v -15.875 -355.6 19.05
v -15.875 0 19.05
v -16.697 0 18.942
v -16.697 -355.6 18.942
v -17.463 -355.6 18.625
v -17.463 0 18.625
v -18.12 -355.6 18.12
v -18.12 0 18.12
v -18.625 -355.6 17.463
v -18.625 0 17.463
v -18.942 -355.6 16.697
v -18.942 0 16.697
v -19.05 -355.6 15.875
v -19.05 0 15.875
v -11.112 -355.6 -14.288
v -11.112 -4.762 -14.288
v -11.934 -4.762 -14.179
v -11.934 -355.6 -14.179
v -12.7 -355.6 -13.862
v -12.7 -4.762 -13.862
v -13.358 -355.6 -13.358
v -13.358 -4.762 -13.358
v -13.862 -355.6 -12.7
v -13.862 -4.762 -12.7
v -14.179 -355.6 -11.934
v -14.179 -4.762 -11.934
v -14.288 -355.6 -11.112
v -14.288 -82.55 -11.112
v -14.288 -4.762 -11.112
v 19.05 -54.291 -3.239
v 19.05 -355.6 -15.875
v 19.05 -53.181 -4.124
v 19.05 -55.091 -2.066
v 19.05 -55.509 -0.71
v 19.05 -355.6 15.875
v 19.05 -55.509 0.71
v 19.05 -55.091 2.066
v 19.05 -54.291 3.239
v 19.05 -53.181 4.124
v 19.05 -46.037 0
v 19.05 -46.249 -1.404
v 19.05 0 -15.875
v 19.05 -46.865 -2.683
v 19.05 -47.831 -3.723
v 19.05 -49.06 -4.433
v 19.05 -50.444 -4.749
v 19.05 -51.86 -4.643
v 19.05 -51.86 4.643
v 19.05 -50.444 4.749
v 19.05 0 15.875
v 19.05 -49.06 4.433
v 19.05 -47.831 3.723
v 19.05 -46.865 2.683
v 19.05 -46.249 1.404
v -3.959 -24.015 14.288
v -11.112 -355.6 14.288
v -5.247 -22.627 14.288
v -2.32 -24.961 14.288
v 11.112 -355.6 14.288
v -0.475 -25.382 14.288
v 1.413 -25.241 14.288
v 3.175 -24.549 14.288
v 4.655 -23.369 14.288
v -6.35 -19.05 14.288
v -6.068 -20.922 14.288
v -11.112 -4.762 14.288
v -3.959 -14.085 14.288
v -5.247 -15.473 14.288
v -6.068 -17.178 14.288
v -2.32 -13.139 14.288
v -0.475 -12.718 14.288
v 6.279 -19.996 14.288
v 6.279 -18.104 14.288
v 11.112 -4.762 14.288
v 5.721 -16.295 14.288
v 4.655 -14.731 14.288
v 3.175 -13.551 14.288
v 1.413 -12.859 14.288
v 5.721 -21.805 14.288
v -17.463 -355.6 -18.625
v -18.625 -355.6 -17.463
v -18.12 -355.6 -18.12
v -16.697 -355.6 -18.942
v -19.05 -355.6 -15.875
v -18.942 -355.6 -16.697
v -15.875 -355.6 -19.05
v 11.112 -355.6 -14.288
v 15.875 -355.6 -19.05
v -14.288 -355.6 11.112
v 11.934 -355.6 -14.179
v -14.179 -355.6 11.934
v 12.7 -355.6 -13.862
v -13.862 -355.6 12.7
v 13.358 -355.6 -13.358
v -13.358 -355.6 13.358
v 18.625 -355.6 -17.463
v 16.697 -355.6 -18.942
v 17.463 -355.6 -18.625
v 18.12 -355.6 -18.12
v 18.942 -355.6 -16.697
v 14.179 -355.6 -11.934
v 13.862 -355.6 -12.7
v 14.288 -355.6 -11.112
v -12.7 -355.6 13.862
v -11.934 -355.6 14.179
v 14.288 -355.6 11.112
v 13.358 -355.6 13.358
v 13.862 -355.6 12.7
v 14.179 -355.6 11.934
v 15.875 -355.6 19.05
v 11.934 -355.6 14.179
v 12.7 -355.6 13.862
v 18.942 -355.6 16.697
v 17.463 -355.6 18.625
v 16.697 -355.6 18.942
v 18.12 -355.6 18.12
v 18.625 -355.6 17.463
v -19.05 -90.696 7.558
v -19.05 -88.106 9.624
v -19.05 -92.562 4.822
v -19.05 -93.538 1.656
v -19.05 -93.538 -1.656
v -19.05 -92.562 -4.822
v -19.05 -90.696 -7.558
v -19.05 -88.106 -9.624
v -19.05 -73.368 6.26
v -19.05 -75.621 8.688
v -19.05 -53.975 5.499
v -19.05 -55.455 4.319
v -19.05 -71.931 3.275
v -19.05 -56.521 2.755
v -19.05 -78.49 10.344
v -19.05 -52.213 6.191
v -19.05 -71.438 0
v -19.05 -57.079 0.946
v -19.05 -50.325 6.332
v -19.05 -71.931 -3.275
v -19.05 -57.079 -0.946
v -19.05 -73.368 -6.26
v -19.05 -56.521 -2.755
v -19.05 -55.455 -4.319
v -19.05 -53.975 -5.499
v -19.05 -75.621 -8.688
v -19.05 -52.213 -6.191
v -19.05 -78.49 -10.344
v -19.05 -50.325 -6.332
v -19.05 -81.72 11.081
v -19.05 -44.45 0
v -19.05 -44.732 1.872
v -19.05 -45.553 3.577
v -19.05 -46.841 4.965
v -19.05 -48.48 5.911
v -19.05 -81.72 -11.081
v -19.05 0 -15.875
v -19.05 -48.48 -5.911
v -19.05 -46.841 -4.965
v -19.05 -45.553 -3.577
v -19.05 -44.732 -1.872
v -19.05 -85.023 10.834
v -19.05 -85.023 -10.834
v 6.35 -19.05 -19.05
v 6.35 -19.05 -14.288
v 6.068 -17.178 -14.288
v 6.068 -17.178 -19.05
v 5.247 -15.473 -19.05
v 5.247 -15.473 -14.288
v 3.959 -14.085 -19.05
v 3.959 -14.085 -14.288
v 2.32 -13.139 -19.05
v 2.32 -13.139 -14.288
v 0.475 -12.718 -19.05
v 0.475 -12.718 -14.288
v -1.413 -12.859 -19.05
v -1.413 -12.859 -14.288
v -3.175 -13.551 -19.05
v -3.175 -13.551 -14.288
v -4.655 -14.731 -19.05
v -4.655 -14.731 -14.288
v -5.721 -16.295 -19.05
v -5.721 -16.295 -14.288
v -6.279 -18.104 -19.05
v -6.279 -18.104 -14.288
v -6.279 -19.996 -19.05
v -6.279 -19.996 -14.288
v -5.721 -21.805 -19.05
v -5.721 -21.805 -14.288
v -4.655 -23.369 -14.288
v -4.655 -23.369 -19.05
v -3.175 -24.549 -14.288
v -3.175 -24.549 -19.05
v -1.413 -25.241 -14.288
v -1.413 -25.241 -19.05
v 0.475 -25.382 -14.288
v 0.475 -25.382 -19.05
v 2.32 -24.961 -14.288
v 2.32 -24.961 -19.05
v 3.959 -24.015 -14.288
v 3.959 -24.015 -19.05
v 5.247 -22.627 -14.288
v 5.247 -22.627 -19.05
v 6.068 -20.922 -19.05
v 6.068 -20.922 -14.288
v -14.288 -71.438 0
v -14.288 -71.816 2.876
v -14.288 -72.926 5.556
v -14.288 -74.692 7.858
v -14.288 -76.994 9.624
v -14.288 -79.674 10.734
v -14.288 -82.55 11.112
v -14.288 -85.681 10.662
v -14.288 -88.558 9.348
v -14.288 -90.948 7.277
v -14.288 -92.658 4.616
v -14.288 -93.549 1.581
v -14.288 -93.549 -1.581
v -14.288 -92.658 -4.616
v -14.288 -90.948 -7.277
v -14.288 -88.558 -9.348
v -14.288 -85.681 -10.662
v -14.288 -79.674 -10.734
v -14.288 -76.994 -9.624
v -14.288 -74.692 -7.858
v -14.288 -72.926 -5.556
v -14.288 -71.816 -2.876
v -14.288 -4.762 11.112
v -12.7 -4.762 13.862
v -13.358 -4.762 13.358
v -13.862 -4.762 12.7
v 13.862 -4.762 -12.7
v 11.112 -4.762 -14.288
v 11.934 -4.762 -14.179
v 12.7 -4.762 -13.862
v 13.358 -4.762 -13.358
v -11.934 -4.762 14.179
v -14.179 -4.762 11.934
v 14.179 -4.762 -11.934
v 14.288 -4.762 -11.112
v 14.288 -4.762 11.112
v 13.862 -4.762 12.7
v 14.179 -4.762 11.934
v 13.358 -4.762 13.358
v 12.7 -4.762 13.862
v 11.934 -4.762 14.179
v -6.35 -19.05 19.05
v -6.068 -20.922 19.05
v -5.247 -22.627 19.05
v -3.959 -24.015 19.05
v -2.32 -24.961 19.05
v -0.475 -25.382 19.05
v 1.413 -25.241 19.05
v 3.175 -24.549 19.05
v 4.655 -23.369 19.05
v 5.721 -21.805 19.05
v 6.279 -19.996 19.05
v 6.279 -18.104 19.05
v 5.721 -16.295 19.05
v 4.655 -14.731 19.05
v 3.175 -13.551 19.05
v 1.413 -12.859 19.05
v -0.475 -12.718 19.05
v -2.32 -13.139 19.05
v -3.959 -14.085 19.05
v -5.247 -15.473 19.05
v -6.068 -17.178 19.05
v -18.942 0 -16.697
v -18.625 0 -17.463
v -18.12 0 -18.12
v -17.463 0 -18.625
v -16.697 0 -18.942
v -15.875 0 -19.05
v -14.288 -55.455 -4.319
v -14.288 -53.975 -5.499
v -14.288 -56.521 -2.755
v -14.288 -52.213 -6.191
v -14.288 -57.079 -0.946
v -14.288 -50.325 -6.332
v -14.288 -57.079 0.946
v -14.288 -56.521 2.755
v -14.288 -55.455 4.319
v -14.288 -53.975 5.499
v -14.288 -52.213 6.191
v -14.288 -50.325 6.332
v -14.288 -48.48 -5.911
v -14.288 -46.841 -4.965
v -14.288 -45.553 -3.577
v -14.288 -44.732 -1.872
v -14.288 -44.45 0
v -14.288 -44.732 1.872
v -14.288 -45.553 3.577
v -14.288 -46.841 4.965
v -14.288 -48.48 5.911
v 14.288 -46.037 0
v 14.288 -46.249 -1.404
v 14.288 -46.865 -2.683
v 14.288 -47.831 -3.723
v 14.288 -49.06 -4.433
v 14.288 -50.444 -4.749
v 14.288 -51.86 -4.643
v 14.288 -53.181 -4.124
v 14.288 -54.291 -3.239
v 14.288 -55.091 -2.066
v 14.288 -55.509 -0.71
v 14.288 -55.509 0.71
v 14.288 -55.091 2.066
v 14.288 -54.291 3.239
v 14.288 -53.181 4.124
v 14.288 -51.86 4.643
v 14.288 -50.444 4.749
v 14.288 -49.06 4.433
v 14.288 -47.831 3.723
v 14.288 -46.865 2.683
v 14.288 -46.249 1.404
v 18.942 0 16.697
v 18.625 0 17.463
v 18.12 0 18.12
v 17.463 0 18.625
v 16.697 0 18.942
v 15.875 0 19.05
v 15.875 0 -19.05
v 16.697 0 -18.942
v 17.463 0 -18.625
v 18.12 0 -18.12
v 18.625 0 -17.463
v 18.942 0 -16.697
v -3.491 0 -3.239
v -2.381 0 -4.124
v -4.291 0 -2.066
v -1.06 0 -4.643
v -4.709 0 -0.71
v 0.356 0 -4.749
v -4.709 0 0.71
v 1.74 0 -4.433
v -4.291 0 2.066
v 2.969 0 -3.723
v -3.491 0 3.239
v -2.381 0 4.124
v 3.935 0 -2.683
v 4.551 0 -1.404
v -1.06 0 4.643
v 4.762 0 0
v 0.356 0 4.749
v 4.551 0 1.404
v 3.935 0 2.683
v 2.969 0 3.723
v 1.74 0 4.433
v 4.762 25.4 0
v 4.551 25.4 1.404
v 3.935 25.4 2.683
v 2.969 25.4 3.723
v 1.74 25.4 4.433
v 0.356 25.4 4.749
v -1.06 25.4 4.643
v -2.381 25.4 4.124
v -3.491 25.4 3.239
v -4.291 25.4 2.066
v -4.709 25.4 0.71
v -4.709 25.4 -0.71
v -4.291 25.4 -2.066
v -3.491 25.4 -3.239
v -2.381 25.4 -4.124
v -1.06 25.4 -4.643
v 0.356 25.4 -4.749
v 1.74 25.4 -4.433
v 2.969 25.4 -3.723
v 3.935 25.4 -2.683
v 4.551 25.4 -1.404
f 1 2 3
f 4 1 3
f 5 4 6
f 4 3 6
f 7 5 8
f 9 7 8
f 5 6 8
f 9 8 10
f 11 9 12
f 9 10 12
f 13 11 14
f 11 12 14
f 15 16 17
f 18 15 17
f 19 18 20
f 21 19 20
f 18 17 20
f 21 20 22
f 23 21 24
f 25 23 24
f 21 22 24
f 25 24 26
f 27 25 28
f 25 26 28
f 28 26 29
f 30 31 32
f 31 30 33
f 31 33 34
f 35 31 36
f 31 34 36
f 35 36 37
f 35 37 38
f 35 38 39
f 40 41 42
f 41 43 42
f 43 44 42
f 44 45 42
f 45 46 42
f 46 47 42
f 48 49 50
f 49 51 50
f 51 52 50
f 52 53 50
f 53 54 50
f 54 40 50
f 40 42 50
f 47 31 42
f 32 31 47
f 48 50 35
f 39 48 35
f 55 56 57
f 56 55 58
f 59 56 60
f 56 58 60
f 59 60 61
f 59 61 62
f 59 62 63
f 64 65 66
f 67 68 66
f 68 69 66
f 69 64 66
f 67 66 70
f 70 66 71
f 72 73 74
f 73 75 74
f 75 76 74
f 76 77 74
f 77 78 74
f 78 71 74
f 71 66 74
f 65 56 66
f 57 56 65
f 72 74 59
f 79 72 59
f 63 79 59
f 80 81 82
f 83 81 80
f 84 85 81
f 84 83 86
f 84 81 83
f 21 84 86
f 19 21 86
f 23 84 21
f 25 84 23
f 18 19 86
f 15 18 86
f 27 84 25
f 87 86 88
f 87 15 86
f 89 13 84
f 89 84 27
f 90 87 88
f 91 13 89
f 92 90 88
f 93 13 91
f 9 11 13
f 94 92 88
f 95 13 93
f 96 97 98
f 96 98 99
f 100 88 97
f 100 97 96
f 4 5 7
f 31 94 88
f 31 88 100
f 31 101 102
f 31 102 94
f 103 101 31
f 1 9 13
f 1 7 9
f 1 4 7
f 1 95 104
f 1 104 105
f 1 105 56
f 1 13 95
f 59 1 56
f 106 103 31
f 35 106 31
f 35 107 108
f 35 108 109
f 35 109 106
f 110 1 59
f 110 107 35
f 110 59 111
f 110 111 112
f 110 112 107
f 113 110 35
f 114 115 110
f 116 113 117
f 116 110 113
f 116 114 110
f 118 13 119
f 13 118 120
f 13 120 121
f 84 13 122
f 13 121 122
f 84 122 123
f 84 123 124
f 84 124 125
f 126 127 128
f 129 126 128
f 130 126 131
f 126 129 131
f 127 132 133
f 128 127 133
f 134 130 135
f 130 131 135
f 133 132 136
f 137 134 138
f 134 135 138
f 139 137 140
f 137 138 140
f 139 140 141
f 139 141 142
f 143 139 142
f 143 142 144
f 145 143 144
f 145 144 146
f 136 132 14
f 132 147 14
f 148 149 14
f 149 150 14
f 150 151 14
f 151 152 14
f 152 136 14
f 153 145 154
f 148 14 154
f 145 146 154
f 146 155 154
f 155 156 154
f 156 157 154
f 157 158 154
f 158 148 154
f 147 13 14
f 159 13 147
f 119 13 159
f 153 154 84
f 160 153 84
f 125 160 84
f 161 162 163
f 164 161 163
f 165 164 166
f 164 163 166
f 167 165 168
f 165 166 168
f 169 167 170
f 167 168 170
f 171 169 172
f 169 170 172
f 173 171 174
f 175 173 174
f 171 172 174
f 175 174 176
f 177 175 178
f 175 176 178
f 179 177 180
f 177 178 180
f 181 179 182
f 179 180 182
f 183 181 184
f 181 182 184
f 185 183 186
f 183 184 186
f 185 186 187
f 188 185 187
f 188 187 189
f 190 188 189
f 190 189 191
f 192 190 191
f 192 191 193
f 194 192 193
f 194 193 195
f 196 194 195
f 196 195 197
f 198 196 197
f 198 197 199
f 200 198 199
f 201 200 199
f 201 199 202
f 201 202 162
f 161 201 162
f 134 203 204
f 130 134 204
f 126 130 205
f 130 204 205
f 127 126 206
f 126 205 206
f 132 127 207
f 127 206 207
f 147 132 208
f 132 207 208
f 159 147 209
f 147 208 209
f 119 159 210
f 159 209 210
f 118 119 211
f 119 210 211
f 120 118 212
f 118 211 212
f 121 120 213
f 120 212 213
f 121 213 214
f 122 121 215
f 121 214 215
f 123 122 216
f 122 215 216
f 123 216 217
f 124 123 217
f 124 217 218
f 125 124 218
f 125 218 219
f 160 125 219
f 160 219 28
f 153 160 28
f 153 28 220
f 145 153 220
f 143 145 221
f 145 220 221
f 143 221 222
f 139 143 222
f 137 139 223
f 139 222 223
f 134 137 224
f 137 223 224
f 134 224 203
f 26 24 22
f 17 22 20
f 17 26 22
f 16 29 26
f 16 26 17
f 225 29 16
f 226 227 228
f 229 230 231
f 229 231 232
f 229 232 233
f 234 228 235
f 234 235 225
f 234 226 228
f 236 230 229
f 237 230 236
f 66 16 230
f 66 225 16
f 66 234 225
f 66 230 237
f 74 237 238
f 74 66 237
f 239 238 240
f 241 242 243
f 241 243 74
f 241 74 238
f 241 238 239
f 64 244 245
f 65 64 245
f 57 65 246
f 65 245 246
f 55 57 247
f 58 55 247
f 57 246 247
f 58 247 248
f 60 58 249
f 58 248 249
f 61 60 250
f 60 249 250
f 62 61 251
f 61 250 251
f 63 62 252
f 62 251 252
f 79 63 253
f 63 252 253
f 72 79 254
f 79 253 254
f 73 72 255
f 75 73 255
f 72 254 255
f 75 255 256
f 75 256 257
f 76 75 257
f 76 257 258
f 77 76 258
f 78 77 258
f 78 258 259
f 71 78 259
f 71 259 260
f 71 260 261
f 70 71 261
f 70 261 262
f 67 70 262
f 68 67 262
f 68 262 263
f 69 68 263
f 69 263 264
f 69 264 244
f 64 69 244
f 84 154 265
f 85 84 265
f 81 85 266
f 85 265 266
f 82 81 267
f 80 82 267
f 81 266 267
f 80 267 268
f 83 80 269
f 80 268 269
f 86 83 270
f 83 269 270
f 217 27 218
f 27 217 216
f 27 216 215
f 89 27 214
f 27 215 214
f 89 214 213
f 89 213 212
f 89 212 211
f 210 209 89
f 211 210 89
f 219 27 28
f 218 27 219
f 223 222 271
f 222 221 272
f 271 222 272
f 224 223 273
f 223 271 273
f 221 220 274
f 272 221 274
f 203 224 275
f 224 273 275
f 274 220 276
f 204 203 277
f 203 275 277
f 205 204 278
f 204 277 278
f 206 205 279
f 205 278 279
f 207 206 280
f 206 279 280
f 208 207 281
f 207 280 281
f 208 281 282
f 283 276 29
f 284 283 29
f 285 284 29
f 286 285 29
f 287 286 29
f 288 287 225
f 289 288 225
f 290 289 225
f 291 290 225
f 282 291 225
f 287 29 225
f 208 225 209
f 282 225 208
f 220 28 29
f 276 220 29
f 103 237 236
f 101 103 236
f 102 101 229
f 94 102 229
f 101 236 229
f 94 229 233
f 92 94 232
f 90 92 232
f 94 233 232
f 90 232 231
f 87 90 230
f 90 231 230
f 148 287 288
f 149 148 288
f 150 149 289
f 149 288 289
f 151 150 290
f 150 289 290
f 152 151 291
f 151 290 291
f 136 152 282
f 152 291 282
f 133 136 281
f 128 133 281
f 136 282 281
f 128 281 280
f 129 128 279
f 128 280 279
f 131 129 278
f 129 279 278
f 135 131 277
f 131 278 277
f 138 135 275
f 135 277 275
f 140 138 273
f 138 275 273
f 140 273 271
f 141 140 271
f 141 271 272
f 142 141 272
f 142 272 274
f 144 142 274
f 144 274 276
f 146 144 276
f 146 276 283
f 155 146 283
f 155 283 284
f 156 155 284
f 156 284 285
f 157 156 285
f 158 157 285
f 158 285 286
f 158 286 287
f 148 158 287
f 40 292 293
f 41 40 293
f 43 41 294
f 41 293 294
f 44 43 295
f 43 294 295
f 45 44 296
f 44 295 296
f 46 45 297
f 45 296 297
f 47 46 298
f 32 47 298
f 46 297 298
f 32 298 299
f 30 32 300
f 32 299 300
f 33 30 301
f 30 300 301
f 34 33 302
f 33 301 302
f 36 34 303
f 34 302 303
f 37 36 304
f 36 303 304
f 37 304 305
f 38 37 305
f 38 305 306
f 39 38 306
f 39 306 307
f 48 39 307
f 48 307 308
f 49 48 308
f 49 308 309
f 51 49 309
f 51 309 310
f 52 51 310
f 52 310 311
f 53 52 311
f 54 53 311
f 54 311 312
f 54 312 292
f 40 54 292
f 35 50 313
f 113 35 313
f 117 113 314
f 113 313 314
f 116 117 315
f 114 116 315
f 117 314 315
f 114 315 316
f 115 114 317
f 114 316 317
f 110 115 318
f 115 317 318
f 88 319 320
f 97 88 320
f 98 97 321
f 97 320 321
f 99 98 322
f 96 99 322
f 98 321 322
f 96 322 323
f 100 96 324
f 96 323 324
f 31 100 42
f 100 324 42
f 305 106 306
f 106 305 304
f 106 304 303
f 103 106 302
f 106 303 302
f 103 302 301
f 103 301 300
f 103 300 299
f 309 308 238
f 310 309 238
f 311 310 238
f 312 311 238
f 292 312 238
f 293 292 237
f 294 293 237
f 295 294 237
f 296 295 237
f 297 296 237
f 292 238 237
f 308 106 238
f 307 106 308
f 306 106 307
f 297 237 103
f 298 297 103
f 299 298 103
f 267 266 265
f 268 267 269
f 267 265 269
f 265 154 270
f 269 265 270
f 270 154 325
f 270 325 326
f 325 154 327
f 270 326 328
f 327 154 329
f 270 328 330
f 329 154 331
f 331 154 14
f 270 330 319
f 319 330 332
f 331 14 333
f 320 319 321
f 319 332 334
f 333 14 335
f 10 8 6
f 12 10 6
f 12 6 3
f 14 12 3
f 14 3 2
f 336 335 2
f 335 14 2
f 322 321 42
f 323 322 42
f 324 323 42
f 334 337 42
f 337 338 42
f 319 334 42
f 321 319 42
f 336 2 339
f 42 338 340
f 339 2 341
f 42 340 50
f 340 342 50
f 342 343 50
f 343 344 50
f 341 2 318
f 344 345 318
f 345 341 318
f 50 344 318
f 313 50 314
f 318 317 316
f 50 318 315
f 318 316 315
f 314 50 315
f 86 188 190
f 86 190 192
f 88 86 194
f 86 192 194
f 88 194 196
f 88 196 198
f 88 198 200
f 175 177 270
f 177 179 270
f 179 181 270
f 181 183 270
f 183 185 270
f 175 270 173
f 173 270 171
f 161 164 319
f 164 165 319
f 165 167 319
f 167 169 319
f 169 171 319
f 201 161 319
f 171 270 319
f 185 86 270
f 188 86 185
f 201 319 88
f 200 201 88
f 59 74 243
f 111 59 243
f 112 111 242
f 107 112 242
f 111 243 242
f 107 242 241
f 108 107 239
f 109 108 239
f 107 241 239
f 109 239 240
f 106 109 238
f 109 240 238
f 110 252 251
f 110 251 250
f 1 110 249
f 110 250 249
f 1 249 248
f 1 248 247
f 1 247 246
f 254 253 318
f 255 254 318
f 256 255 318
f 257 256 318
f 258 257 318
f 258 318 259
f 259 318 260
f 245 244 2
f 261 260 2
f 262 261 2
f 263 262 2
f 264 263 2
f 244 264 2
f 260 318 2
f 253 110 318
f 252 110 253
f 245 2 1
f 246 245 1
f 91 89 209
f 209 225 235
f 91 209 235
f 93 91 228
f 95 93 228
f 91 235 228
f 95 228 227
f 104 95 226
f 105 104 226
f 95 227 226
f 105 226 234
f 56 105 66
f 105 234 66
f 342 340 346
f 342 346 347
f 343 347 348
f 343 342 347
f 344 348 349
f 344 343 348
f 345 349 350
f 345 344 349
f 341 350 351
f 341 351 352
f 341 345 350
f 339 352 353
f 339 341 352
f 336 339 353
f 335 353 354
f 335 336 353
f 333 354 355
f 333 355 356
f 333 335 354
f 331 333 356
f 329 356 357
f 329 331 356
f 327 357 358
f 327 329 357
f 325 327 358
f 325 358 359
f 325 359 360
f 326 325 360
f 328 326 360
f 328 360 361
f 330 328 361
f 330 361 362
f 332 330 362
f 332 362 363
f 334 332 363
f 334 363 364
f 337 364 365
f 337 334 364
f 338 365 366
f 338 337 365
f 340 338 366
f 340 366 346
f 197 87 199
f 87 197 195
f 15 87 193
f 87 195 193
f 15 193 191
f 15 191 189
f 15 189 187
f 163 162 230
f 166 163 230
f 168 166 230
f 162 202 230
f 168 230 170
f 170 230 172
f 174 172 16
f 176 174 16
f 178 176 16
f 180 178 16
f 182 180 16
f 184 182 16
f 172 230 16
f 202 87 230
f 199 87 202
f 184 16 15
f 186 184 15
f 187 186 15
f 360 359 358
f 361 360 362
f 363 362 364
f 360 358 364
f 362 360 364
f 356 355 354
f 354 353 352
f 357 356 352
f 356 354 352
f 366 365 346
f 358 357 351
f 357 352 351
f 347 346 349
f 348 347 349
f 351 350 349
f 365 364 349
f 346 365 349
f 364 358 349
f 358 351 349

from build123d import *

# Parameters (mm, degrees)
F7_DEPTH  = 355.6
F8_D      = 12.7
F8_DEPTH  = 19.051
F9_D      = 12.7
F0_R      = 4.7625
F2_DEPTH  = 4.7625
F4_D      = 9.525
F4_DEPTH  = 19.051
F5_D      = 12.7
F5_DEPTH  = 19.051
F10_D     = 22.225
F10_DEPTH = 19.051
F6_DEPTH  = 25.4


with BuildPart() as f7:
    # F0 (on Front) → F7 (new body)
    with BuildSketch(Plane.XZ):
        with BuildLine():
            Line((-15.875, -19.05), (15.875, -19.05))
            ThreePointArc((15.875, -19.05), (18.1200640303, -18.1200640303), (19.05, -15.875))
            Line((19.05, -15.875), (19.05, 15.875))
            ThreePointArc((19.05, 15.875), (18.1200640303, 18.1200640303), (15.875, 19.05))
            Line((15.875, 19.05), (-15.875, 19.05))
            ThreePointArc((-15.875, 19.05), (-18.1200640303, 18.1200640303), (-19.05, 15.875))
            Line((-19.05, 15.875), (-19.05, -15.875))
            ThreePointArc((-19.05, -15.875), (-18.1200640303, -18.1200640303), (-15.875, -19.05))
        make_face()
        with BuildLine():
            ThreePointArc((14.2875, -11.1125), (13.3575640303, -13.3575640303), (11.1125, -14.2875))
            Line((11.1125, -14.2875), (-11.1125, -14.2875))
            ThreePointArc((-11.1125, -14.2875), (-13.3575640303, -13.3575640303), (-14.2875, -11.1125))
            Line((-14.2875, -11.1125), (-14.2875, 11.1125))
            ThreePointArc((-14.2875, 11.1125), (-13.3575640303, 13.3575640303), (-11.1125, 14.2875))
            Line((-11.1125, 14.2875), (11.1125, 14.2875))
            ThreePointArc((11.1125, 14.2875), (13.3575640303, 13.3575640303), (14.2875, 11.1125))
            Line((14.2875, 11.1125), (14.2875, -11.1125))
        make_face(mode=Mode.SUBTRACT)
    extrude(amount=F7_DEPTH)

    # F8 (through all, one way)
    with BuildSketch(Plane.XY):
        with Locations((0, -19.05)):
            Circle(F8_D / 2)
    extrude(amount=-F8_DEPTH, mode=Mode.SUBTRACT)

    # F9 (through all)
    with Locations(Plane(origin=(0, 0, 0), x_dir=(1, 0, 0), z_dir=(0, 0, -1))):
        with Locations((0, 19.05)):
            Hole(F9_D / 2)

    # F0 (on Front) → F2 (join)
    with BuildSketch(Plane.XZ):
        with BuildLine():
            Line((-11.1125, -14.2875), (11.1125, -14.2875))
            ThreePointArc((11.1125, -14.2875), (13.3575640303, -13.3575640303), (14.2875, -11.1125))
            Line((14.2875, -11.1125), (14.2875, 11.1125))
            ThreePointArc((14.2875, 11.1125), (13.3575640303, 13.3575640303), (11.1125, 14.2875))
            Line((11.1125, 14.2875), (-11.1125, 14.2875))
            ThreePointArc((-11.1125, 14.2875), (-13.3575640303, 13.3575640303), (-14.2875, 11.1125))
            Line((-14.2875, 11.1125), (-14.2875, -11.1125))
            ThreePointArc((-14.2875, -11.1125), (-13.3575640303, -13.3575640303), (-11.1125, -14.2875))
        make_face()
        Circle(F0_R, mode=Mode.SUBTRACT)
        Circle(F0_R)
    extrude(amount=F2_DEPTH)

    # F4 (through all, one way)
    with BuildSketch(Plane(origin=(0, 0, 0), x_dir=(0, 1, 0), z_dir=(-1, 0, 0))):
        with Locations((-50.8, 0)):
            Circle(F4_D / 2)
    extrude(amount=-F4_DEPTH, mode=Mode.SUBTRACT)

    # F5 (through all, one way)
    with BuildSketch(Plane.YZ):
        with Locations((-50.8, 0)):
            Circle(F5_D / 2)
    extrude(amount=-F5_DEPTH, mode=Mode.SUBTRACT)

    # F10 (through all, one way)
    with BuildSketch(Plane.YZ):
        with Locations((-82.55, 0)):
            Circle(F10_D / 2)
    extrude(amount=-F10_DEPTH, mode=Mode.SUBTRACT)

    # F0 (on Front) → F6 (join)
    with BuildSketch(Plane.XZ):
        Circle(F0_R)
    extrude(amount=-F6_DEPTH)


solid = f7.part
